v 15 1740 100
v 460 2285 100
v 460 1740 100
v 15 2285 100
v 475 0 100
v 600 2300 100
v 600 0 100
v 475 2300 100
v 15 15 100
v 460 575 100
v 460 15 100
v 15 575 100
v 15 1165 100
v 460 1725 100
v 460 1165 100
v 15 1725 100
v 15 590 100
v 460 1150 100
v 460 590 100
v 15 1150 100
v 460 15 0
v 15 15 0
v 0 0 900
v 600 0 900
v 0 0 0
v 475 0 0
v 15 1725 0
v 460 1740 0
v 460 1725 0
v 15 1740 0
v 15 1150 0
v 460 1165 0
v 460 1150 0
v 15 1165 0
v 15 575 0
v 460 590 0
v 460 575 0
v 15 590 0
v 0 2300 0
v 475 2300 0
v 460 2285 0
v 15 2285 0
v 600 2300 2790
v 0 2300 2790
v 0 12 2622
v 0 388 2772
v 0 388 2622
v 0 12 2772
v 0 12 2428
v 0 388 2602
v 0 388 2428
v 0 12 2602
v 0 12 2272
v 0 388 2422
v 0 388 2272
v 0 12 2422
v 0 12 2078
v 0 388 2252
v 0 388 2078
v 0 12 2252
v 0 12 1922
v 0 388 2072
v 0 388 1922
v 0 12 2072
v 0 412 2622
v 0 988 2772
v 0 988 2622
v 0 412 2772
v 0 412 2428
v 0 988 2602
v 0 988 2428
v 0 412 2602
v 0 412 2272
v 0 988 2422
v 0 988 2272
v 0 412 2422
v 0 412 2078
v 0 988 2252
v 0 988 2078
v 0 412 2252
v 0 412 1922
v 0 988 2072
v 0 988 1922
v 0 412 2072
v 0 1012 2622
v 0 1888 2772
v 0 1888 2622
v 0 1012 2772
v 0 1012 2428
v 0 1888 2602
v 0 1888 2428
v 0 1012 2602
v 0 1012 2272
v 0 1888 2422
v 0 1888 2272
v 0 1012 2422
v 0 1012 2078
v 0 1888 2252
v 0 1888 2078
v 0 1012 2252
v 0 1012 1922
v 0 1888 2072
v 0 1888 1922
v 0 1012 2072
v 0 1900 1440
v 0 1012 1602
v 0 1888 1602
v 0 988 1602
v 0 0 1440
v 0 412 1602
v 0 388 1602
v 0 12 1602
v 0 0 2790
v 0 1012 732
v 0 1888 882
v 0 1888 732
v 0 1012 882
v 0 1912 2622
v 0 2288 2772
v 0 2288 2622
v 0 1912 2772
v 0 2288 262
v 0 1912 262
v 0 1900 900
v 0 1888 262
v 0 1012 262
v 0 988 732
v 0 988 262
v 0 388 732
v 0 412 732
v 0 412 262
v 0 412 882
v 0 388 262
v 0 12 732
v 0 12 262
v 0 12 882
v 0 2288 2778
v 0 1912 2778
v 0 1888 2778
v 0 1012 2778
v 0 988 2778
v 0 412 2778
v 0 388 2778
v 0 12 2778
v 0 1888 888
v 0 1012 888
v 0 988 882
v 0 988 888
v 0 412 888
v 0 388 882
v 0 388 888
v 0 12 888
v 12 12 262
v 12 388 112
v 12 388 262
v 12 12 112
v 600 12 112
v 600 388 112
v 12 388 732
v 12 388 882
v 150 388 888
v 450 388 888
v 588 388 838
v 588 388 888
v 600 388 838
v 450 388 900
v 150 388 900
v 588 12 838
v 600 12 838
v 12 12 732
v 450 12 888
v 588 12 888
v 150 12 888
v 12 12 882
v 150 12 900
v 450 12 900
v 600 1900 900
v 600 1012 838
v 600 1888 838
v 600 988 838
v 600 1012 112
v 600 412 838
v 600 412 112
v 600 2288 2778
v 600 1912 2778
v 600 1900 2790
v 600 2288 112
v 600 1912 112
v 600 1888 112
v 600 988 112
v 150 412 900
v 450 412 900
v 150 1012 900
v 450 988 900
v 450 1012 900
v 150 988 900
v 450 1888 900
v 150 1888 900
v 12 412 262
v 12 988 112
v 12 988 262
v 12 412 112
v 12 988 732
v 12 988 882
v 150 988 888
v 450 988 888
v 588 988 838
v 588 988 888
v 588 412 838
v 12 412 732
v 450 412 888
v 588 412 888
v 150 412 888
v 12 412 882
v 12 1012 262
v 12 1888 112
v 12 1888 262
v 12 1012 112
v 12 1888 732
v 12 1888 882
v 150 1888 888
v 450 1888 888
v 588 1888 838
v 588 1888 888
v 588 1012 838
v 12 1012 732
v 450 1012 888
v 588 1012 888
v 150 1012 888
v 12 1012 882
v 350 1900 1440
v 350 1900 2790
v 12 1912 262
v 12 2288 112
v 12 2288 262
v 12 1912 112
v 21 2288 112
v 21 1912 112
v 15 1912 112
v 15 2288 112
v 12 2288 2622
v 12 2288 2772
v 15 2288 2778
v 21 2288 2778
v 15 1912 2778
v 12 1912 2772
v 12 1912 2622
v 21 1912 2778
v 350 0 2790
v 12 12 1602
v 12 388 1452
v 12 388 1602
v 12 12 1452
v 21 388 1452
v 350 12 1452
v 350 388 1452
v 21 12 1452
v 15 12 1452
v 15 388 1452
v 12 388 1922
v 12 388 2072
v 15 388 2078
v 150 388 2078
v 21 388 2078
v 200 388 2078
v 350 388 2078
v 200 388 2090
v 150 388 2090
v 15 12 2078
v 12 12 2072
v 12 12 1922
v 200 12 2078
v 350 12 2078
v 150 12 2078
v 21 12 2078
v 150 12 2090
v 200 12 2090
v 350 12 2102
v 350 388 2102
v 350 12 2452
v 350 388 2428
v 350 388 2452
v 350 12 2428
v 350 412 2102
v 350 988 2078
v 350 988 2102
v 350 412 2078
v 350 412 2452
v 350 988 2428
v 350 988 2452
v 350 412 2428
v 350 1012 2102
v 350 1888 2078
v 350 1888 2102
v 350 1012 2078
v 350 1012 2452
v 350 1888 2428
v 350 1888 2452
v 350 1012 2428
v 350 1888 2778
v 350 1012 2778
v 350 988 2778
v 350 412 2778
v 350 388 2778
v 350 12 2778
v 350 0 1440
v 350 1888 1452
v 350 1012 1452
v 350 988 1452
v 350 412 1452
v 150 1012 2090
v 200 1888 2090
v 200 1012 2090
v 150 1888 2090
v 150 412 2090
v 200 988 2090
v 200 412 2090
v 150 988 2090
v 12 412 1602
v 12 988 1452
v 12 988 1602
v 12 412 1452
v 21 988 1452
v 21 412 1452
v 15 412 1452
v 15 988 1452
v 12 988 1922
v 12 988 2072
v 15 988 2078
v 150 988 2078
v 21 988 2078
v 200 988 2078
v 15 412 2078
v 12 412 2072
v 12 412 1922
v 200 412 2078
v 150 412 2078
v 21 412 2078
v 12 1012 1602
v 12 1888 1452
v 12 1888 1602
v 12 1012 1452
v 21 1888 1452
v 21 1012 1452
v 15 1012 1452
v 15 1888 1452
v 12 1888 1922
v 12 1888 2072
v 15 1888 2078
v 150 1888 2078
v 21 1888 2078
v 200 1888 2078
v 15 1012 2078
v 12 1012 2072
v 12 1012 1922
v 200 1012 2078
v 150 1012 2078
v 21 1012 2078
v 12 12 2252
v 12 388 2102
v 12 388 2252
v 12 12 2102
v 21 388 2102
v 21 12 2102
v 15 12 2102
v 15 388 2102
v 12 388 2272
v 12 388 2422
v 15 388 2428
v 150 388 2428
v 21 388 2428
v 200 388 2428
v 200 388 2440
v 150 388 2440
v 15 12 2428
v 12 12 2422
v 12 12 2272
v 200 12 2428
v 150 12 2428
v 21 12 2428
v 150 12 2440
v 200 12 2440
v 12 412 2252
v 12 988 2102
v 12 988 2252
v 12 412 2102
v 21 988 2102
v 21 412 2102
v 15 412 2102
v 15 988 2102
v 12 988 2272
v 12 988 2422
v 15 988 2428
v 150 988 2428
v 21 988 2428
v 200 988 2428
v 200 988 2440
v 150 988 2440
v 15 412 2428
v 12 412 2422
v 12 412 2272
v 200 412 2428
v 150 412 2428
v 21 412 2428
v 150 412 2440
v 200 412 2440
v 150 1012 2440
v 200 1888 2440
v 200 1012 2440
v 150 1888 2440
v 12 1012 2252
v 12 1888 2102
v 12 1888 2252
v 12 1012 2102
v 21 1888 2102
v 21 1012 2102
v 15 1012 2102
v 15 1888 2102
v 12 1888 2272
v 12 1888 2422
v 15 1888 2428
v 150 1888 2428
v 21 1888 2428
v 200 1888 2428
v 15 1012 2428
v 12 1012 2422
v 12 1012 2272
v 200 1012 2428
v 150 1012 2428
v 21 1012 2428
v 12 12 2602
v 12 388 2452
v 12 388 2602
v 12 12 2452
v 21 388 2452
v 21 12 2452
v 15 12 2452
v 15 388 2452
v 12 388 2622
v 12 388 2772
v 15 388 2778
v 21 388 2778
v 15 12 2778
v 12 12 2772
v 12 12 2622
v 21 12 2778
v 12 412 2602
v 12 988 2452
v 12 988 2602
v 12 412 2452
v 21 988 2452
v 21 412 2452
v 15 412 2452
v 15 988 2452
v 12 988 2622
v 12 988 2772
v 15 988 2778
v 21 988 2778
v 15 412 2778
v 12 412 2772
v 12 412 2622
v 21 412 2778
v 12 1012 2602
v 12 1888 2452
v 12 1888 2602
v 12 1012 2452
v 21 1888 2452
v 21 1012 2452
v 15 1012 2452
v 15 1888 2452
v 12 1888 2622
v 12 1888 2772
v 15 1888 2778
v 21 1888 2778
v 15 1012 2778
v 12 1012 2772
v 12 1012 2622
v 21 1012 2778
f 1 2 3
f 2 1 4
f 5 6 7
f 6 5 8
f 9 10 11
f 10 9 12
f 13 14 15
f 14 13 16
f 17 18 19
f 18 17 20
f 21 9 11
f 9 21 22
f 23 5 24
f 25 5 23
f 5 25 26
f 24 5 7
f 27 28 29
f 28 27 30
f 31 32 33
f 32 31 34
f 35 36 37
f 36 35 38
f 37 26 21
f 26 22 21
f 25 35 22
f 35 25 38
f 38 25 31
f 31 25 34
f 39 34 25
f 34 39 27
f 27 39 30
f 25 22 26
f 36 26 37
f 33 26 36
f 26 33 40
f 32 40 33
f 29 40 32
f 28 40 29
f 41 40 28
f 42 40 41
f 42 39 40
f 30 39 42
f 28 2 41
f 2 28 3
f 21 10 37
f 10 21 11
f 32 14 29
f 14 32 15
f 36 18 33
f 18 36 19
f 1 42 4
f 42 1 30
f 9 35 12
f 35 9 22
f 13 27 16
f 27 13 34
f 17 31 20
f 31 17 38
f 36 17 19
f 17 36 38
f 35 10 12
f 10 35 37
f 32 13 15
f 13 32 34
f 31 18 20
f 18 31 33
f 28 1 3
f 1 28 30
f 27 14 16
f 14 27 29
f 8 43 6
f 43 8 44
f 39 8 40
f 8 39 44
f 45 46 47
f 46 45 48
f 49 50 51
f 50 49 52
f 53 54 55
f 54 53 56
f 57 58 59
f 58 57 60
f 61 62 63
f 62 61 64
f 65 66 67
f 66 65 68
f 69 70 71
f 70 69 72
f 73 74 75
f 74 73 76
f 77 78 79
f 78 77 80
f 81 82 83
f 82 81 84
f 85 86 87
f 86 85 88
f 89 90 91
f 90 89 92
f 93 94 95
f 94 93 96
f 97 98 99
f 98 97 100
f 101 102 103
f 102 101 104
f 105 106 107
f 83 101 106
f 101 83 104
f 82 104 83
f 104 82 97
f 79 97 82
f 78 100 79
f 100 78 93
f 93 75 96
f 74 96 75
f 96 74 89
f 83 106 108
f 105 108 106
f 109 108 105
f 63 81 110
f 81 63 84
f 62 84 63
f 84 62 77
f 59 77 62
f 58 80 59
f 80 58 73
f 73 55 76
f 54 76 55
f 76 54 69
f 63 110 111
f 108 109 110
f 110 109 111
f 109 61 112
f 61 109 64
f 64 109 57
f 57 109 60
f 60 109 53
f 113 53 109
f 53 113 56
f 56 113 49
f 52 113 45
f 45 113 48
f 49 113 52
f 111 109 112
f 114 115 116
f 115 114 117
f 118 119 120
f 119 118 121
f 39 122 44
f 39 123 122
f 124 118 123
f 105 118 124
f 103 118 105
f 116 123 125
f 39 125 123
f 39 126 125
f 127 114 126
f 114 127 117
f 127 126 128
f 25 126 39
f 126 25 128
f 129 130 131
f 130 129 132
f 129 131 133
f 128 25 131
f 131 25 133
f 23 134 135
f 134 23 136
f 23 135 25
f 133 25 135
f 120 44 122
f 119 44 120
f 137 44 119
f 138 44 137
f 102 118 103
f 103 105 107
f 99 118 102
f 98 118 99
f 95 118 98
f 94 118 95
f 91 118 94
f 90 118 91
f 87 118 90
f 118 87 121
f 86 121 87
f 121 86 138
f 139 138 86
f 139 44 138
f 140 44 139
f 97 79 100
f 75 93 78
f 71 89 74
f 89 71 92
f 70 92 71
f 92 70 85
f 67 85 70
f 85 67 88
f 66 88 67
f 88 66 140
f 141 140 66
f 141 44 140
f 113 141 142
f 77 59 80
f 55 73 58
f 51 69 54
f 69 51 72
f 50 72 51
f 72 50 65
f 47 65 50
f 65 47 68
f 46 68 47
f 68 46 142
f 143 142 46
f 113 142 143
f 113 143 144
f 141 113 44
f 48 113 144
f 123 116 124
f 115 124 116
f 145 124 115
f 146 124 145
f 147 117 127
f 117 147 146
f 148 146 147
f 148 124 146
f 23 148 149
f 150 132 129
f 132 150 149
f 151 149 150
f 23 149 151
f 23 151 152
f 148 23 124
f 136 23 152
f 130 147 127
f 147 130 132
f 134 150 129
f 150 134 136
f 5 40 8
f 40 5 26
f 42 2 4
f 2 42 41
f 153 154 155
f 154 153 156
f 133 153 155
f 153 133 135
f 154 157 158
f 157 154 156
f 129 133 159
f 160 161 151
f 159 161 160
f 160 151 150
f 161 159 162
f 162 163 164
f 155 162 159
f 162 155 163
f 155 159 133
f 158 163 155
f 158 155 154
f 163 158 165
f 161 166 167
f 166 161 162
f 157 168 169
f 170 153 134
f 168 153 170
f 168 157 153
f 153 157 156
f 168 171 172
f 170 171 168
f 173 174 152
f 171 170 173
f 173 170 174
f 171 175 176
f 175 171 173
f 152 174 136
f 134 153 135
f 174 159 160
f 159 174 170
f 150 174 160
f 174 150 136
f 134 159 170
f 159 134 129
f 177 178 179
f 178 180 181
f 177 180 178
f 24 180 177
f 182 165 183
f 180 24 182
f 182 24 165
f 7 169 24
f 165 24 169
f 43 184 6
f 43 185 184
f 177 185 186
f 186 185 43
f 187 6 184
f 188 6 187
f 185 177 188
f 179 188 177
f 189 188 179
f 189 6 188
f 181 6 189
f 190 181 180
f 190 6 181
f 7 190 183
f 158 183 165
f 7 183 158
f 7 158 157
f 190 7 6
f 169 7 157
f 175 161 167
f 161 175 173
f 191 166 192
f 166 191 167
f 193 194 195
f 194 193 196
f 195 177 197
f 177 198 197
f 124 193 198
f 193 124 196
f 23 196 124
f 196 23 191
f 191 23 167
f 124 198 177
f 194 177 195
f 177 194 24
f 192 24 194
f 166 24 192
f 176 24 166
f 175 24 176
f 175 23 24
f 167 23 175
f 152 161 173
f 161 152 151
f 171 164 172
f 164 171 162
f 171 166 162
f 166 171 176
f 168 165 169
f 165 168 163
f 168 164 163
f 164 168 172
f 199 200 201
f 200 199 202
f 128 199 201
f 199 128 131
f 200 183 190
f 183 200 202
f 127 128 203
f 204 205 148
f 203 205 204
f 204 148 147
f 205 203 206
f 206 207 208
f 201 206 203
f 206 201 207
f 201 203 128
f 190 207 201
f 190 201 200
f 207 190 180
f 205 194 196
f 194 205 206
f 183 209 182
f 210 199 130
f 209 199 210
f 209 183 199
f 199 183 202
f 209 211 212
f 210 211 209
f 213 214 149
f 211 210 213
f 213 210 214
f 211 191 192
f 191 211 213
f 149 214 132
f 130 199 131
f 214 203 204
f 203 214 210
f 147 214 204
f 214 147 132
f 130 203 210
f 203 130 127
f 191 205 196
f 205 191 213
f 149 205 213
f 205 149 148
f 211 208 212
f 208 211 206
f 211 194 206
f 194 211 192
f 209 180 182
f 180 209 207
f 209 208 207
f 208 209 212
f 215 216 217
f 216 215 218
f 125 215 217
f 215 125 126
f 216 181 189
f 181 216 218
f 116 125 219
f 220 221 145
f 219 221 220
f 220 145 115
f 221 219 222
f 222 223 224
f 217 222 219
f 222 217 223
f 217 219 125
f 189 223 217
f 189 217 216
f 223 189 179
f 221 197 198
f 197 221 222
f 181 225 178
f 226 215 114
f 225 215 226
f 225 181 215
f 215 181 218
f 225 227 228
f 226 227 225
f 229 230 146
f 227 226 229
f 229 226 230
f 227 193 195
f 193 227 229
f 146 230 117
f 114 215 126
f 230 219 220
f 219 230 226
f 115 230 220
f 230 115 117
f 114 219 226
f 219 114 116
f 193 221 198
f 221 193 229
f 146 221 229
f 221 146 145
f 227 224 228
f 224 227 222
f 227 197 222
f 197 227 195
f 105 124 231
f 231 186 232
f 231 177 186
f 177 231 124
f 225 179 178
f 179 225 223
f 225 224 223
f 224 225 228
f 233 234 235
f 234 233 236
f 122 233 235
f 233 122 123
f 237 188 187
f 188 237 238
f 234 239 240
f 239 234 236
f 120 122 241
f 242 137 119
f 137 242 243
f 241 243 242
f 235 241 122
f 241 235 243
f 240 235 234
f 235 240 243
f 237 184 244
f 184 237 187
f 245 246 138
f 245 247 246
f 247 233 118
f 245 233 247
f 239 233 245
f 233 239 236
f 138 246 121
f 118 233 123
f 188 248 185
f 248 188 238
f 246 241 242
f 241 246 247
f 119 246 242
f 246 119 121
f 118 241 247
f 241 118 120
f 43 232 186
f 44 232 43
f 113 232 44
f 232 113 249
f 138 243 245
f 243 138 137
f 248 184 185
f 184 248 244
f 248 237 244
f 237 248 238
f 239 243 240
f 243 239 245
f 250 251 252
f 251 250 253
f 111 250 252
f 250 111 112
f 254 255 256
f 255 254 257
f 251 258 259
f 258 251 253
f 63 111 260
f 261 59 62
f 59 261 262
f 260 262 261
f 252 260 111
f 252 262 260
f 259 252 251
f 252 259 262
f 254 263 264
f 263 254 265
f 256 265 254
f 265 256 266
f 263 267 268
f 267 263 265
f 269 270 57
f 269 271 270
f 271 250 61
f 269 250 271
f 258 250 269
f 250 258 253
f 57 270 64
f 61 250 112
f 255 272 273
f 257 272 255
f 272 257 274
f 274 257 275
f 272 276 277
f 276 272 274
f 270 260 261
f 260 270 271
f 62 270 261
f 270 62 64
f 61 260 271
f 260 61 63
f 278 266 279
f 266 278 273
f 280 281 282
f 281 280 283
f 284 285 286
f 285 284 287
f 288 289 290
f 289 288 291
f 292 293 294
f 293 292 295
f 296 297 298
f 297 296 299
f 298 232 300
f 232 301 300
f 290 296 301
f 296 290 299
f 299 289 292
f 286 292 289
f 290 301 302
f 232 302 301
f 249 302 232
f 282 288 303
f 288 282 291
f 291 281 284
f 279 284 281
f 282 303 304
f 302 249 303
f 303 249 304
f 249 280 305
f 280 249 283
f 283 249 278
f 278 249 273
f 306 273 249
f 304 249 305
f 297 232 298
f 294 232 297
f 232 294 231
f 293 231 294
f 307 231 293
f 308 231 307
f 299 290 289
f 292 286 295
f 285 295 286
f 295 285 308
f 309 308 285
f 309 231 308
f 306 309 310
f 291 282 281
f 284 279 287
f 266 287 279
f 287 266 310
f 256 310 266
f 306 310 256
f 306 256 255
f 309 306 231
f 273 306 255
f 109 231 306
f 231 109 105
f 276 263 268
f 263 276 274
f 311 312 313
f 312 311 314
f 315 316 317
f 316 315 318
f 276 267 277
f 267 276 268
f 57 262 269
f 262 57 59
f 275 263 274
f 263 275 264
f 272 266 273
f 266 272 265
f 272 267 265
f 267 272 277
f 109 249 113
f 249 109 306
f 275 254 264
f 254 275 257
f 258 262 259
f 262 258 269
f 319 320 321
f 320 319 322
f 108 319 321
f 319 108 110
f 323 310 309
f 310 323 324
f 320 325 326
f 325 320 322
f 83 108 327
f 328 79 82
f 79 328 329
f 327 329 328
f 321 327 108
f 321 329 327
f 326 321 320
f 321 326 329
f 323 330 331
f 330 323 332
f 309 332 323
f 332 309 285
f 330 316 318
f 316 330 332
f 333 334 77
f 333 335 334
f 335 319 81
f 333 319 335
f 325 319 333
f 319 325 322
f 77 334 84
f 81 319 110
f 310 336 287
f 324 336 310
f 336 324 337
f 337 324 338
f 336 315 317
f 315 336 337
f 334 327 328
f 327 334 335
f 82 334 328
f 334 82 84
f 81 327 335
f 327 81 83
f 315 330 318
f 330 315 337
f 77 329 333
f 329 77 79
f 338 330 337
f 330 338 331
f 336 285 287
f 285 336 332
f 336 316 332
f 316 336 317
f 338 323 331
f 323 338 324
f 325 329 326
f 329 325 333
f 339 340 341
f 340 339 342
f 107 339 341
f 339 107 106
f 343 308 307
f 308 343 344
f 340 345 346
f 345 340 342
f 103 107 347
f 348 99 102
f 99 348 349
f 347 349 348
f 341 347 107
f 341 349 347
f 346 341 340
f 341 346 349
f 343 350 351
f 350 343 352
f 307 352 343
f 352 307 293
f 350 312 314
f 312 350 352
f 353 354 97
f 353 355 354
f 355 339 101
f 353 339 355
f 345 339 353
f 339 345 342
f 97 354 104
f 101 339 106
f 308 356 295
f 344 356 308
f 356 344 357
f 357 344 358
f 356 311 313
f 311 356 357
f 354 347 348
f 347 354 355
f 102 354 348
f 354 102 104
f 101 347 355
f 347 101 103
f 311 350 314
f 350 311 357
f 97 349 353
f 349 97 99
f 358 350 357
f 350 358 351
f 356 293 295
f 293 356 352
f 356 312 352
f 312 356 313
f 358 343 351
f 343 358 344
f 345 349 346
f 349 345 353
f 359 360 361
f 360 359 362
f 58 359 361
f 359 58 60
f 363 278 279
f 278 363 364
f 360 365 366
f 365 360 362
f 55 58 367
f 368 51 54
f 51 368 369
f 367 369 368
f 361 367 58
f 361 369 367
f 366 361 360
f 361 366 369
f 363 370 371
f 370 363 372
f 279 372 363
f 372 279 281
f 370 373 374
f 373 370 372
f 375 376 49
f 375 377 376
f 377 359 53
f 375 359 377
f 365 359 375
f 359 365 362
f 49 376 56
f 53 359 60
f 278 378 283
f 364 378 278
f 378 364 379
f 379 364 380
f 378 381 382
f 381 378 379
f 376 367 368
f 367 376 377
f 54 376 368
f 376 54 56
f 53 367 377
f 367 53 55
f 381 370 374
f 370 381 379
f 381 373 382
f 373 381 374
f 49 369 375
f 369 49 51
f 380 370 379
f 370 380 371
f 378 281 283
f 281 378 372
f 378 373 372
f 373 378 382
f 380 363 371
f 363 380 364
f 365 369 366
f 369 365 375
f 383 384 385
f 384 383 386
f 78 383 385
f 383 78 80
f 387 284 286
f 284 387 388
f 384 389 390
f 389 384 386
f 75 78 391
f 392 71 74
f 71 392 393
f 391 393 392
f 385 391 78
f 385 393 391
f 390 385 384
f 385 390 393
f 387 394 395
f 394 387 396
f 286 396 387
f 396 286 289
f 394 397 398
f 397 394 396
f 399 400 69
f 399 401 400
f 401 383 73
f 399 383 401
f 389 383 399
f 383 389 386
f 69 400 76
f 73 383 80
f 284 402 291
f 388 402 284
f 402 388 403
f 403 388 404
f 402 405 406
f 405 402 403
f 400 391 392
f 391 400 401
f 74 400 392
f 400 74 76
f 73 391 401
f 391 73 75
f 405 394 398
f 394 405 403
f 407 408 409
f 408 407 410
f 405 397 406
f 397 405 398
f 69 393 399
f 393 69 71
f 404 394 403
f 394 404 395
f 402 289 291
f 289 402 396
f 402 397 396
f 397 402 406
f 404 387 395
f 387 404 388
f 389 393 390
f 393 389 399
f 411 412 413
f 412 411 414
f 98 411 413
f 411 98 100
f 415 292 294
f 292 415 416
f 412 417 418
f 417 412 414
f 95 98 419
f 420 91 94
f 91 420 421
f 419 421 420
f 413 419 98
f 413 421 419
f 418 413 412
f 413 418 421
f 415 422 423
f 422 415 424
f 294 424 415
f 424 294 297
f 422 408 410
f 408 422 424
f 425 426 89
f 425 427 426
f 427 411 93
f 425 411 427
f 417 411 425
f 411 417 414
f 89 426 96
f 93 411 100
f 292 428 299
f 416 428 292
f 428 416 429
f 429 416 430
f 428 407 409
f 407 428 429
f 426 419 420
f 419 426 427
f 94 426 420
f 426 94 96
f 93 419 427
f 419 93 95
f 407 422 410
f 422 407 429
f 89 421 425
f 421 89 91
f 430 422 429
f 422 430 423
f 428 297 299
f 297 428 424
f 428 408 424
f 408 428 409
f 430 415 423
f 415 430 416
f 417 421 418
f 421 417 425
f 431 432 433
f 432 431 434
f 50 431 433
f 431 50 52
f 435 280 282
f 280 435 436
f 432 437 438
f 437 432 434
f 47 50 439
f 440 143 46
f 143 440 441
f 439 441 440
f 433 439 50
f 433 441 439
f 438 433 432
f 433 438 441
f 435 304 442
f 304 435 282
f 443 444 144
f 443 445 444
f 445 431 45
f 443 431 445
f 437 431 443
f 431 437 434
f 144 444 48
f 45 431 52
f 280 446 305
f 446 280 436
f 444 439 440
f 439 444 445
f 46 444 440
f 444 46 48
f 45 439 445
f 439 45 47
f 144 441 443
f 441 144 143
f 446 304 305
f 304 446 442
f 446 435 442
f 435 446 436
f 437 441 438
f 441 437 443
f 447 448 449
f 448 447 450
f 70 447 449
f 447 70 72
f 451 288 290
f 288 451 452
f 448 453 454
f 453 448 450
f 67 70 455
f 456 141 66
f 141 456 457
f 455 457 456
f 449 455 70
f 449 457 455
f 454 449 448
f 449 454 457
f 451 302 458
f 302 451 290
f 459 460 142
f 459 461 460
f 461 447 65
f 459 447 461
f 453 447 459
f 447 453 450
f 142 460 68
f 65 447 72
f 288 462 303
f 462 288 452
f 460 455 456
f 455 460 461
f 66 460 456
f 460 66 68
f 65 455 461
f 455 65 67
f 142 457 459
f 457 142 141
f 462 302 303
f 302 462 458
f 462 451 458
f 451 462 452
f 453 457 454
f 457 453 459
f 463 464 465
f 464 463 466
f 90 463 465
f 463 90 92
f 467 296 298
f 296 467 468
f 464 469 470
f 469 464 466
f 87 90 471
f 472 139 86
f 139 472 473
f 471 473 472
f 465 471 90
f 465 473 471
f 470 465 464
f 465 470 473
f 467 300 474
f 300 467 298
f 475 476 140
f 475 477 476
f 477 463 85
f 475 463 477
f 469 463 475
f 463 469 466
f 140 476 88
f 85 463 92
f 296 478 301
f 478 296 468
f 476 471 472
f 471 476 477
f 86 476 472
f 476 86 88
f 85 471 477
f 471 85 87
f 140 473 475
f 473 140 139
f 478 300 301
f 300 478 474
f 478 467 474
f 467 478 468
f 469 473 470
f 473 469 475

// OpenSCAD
use <CajoneriaLib.scad>
// definicion de medidas de muebles
// Modular Bajo
espesor=15;
anchoM=0;
altoM=1;
profM=2;

// Medidas modulos 
//modularX(anchoMod, altoMod, profundoMod, espesor, refuerzo, esqueleto)
Mod_1 = [400, 800, 600,"Si","Si","No"];
Mod_2 = [600, 800, 600,"Si","Si","No"];
Mod_3 = [900, 800, 600,"Si","Si","No"];
Mod_4 = [400, 2690, 600,"No","No","Si"];
// Cajoneria alta primer nivel
Mod_11 = [400, 650, 350,"No","Si","Si"];
Mod_12 = [600, 650, 350,"No","Si","Si"];
Mod_13 = [900, 650, 350,"No","Si","Si"];
// Cajoneria alta segundo nivel
Mod_21 = [400, 350, 350,"No","Si","Si"];
Mod_22 = [600, 350, 350,"No","Si","Si"];
Mod_23 = [900, 350, 350,"No","Si","Si"];
// Cajoneria alta tercer nivel
Mod_31 = [400, 350, 350,"No","No","Si"];
Mod_32 = [600, 350, 350,"No","No","Si"];
Mod_33 = [900, 350, 350,"No","No","Si"];
// Lista de modulos
Modulos = [
    Mod_1,Mod_2,Mod_3,Mod_4,
    Mod_11,Mod_12,Mod_13,
    Mod_21,Mod_22,Mod_23,
    Mod_31,Mod_32,Mod_33 
    ];

anchoRiel=13*2;
altoZocalo=100;
alturaModAlto=1440;

// Posiciones modulos
PMod_1=[0,0,altoZocalo];
PMod_2=[0,Mod_1[anchoM],altoZocalo];
PMod_3=[0,Mod_1[anchoM]+Mod_2[anchoM],altoZocalo];
PMod_4=[0,Mod_1[anchoM]+Mod_2[anchoM]+Mod_3[anchoM],altoZocalo];
//Posiciones de Modulos Cajoneria Alta primer nivel
PMod_11=[0,0,alturaModAlto];
PMod_12=[0,Mod_11[anchoM],alturaModAlto];
PMod_13=[0,Mod_11[anchoM]+Mod_12[anchoM],alturaModAlto];    
//Posiciones de Modulos Cajoneria Alta segundo nivel
PMod_21=[0,0,alturaModAlto+Mod_11[1]];
PMod_22=[0,Mod_21[anchoM],alturaModAlto+Mod_11[1]];
PMod_23=[0,Mod_21[anchoM]+Mod_22[anchoM],alturaModAlto+Mod_11[1]];
//Posiciones de Modulos Cajoneria Alta tercer nivel
PMod_31=[0,0,alturaModAlto+Mod_11[1]+Mod_21[1]];
PMod_32=[0,Mod_31[anchoM],alturaModAlto+Mod_11[1]+Mod_21[1]];
PMod_33=[0,Mod_21[anchoM]+Mod_22[anchoM],alturaModAlto+Mod_11[1]+Mod_21[1]];

// Lista de posiciones de modulos
Pos_Modulos = [
    PMod_1,PMod_2,PMod_3,PMod_4,
    PMod_11,PMod_12,PMod_13,
    PMod_21,PMod_22,PMod_23,
    PMod_31,PMod_32,PMod_33,
    ];

altoCajon=200;
separaCajon=40;
altoCajonDelgado=80;

// Divisiones 
// Hacemos la suposición que el fondo es de 6mm, por eso
// reducimos y recorremos 21mm las disiones en Y 
DivisionesH =[
    [3,[PMod_4[0]+21,PMod_4[1]+espesor,PMod_4[2]+800]],
    [3,[PMod_4[0]+21,PMod_4[1]+espesor,PMod_4[2]+1072]],
    [3,[PMod_4[0]+21,PMod_4[1]+espesor,PMod_4[2]+1345]],
    [3,[PMod_4[0]+21,PMod_4[1]+espesor,PMod_4[2]+1665]],
    [3,[PMod_4[0]+21,PMod_4[1]+espesor,PMod_4[2]+1980]],
    [3,[PMod_4[0]+21,PMod_4[1]+espesor,PMod_4[2]+2330]],
    [4,[PMod_11[0]+21,PMod_11[1]+espesor,alturaModAlto+Mod_11[1]/2]],
    [5,[PMod_12[0]+21,PMod_12[1]+espesor,alturaModAlto+Mod_12[1]/2]],
    [6,[PMod_13[0]+21,PMod_13[1]+espesor,alturaModAlto+Mod_13[1]/2]]
    ];

Puerta_1 =[Mod_4[0],Mod_4[1]*0.25+15];
Puerta_2 =[Mod_4[0],Mod_4[1]*0.23+15];
Puerta_3 =[Mod_4[0],Mod_4[1]*0.20+20];

Puertas =[
    [Puerta_1,[PMod_4[0]+Mod_1[2],PMod_4[1],PMod_4[2]+1995]],
    [Puerta_2,[PMod_4[0]+Mod_1[2],PMod_4[1],PMod_4[2]+1355]],
    [Puerta_3,[PMod_4[0]+Mod_1[2],PMod_4[1],PMod_4[2]+790]],
    [Puerta_2,[0,0,0]],
    [Puerta_2,[0,0,0]],
    [Puerta_2,[0,0,0]],
    [Puerta_2,[0,0,0]],
    [Puerta_2,[0,0,0]],
    [Puerta_2,[0,0,0]],
    [Puerta_2,[0,0,0]]
    ];
   
//    [5,[PMod_12[0]+650,PMod_12[1]+espesor,PMod_12[2]]],
//    [6,[PMod_13[0]+650,PMod_13[1],PMod_13[2]]],
//    [7,[PMod_21[0]+600,PMod_21[1],PMod_21[2]]],
//    [8,[PMod_22[0]+600,PMod_22[1]+espesor,alturaModAlto+Mod_22[1]/2]],
//    [9,[PMod_23[0]+600,PMod_23[1]+espesor,alturaModAlto+Mod_23[1]/2]],
//    [11,[PMod_31[0]+600,PMod_31[1]+espesor,alturaModAlto+Mod_31[1]/2]],
//    [12,[PMod_32[0]+600,PMod_13[1]+espesor,alturaModAlto+Mod_32[1]/2]]
//    ];

// Posiciones cajones
Pcajon_11 = [50,anchoRiel+2,altoZocalo+espesor+10];
Pcajon_12 = [50,anchoRiel+2,altoZocalo+espesor+altoCajon+separaCajon+10];
Pcajon_13 = [50,anchoRiel+2,altoZocalo+espesor+altoCajon*2+separaCajon*2+10];
Pcajon_21 = [50,Mod_1[anchoM]+anchoRiel+2,altoZocalo+espesor+10];
Pcajon_22 = [50,Mod_1[anchoM]+anchoRiel+2,altoZocalo+espesor+altoCajon+separaCajon+10];
Pcajon_23 = [50,Mod_1[anchoM]+anchoRiel+2,altoZocalo+espesor+altoCajon*2+separaCajon*2+10];
Pcajon_24 = [50,Mod_1[anchoM]+anchoRiel+2,altoZocalo+espesor+altoCajon*2+altoCajonDelgado+separaCajon*3+10];
Pcajon_31 = [50,Mod_1[anchoM]+Mod_2[anchoM]+anchoRiel+2,altoZocalo+espesor+10];
Pcajon_32 = [50,Mod_1[anchoM]+Mod_2[anchoM]+anchoRiel+2,altoZocalo+espesor+altoCajon+separaCajon+10];
Pcajon_33 = [50,Mod_1[anchoM]+Mod_2[anchoM]+anchoRiel+2,altoZocalo+espesor+altoCajon*2+separaCajon*2+10];
Pcajon_41 = [50,Mod_1[anchoM]+Mod_2[anchoM]+Mod_3[anchoM]+anchoRiel+2,altoZocalo+espesor+10];
Pcajon_42 = [50,Mod_1[anchoM]+Mod_2[anchoM]+Mod_3[anchoM]+anchoRiel+2,altoZocalo+espesor+altoCajon+separaCajon+10];
Pcajon_43 = [50,Mod_1[anchoM]+Mod_2[anchoM]+Mod_3[anchoM]+anchoRiel+2,altoZocalo+espesor+altoCajon*2+separaCajon*2+10];
Pcajon_44 = [50,Mod_1[anchoM]+Mod_2[anchoM]+Mod_3[anchoM]+anchoRiel+2,altoZocalo+espesor+altoCajon*3+separaCajon*3+10];

//Cajones =[
//          [indexModulo,Pos_Cajon,AltoCajon],
//          [indexModulo,Pos_Cajon,AltoCajon],
//]
// Lista de Cajones
Cajones = [
    [0,Pcajon_11,altoCajon],[0,Pcajon_12,altoCajon],[0,Pcajon_13,altoCajon],
    [1,Pcajon_21,altoCajon],[1,Pcajon_22,altoCajon],[1,Pcajon_23,altoCajonDelgado],[1,Pcajon_24,altoCajonDelgado],
    [2,Pcajon_31,altoCajon],[2,Pcajon_32,altoCajon],[2,Pcajon_33,altoCajon],
    [3,Pcajon_41,altoCajon],[3,Pcajon_42,altoCajon],[3,Pcajon_43,altoCajon],[3,Pcajon_44,altoCajon]
    ];

//paredes2();
//socalo(Ar_ancho, Ar_alto, Ar_profundo, espesor, div=10,espacio=240)
socalo(490, 2300, 100, 15, 5, 200);

modulosdeCocina(Modulos, Pos_Modulos, 12, Cajones, 12, DivisionesH, 8, Puertas, 9, espesor);
